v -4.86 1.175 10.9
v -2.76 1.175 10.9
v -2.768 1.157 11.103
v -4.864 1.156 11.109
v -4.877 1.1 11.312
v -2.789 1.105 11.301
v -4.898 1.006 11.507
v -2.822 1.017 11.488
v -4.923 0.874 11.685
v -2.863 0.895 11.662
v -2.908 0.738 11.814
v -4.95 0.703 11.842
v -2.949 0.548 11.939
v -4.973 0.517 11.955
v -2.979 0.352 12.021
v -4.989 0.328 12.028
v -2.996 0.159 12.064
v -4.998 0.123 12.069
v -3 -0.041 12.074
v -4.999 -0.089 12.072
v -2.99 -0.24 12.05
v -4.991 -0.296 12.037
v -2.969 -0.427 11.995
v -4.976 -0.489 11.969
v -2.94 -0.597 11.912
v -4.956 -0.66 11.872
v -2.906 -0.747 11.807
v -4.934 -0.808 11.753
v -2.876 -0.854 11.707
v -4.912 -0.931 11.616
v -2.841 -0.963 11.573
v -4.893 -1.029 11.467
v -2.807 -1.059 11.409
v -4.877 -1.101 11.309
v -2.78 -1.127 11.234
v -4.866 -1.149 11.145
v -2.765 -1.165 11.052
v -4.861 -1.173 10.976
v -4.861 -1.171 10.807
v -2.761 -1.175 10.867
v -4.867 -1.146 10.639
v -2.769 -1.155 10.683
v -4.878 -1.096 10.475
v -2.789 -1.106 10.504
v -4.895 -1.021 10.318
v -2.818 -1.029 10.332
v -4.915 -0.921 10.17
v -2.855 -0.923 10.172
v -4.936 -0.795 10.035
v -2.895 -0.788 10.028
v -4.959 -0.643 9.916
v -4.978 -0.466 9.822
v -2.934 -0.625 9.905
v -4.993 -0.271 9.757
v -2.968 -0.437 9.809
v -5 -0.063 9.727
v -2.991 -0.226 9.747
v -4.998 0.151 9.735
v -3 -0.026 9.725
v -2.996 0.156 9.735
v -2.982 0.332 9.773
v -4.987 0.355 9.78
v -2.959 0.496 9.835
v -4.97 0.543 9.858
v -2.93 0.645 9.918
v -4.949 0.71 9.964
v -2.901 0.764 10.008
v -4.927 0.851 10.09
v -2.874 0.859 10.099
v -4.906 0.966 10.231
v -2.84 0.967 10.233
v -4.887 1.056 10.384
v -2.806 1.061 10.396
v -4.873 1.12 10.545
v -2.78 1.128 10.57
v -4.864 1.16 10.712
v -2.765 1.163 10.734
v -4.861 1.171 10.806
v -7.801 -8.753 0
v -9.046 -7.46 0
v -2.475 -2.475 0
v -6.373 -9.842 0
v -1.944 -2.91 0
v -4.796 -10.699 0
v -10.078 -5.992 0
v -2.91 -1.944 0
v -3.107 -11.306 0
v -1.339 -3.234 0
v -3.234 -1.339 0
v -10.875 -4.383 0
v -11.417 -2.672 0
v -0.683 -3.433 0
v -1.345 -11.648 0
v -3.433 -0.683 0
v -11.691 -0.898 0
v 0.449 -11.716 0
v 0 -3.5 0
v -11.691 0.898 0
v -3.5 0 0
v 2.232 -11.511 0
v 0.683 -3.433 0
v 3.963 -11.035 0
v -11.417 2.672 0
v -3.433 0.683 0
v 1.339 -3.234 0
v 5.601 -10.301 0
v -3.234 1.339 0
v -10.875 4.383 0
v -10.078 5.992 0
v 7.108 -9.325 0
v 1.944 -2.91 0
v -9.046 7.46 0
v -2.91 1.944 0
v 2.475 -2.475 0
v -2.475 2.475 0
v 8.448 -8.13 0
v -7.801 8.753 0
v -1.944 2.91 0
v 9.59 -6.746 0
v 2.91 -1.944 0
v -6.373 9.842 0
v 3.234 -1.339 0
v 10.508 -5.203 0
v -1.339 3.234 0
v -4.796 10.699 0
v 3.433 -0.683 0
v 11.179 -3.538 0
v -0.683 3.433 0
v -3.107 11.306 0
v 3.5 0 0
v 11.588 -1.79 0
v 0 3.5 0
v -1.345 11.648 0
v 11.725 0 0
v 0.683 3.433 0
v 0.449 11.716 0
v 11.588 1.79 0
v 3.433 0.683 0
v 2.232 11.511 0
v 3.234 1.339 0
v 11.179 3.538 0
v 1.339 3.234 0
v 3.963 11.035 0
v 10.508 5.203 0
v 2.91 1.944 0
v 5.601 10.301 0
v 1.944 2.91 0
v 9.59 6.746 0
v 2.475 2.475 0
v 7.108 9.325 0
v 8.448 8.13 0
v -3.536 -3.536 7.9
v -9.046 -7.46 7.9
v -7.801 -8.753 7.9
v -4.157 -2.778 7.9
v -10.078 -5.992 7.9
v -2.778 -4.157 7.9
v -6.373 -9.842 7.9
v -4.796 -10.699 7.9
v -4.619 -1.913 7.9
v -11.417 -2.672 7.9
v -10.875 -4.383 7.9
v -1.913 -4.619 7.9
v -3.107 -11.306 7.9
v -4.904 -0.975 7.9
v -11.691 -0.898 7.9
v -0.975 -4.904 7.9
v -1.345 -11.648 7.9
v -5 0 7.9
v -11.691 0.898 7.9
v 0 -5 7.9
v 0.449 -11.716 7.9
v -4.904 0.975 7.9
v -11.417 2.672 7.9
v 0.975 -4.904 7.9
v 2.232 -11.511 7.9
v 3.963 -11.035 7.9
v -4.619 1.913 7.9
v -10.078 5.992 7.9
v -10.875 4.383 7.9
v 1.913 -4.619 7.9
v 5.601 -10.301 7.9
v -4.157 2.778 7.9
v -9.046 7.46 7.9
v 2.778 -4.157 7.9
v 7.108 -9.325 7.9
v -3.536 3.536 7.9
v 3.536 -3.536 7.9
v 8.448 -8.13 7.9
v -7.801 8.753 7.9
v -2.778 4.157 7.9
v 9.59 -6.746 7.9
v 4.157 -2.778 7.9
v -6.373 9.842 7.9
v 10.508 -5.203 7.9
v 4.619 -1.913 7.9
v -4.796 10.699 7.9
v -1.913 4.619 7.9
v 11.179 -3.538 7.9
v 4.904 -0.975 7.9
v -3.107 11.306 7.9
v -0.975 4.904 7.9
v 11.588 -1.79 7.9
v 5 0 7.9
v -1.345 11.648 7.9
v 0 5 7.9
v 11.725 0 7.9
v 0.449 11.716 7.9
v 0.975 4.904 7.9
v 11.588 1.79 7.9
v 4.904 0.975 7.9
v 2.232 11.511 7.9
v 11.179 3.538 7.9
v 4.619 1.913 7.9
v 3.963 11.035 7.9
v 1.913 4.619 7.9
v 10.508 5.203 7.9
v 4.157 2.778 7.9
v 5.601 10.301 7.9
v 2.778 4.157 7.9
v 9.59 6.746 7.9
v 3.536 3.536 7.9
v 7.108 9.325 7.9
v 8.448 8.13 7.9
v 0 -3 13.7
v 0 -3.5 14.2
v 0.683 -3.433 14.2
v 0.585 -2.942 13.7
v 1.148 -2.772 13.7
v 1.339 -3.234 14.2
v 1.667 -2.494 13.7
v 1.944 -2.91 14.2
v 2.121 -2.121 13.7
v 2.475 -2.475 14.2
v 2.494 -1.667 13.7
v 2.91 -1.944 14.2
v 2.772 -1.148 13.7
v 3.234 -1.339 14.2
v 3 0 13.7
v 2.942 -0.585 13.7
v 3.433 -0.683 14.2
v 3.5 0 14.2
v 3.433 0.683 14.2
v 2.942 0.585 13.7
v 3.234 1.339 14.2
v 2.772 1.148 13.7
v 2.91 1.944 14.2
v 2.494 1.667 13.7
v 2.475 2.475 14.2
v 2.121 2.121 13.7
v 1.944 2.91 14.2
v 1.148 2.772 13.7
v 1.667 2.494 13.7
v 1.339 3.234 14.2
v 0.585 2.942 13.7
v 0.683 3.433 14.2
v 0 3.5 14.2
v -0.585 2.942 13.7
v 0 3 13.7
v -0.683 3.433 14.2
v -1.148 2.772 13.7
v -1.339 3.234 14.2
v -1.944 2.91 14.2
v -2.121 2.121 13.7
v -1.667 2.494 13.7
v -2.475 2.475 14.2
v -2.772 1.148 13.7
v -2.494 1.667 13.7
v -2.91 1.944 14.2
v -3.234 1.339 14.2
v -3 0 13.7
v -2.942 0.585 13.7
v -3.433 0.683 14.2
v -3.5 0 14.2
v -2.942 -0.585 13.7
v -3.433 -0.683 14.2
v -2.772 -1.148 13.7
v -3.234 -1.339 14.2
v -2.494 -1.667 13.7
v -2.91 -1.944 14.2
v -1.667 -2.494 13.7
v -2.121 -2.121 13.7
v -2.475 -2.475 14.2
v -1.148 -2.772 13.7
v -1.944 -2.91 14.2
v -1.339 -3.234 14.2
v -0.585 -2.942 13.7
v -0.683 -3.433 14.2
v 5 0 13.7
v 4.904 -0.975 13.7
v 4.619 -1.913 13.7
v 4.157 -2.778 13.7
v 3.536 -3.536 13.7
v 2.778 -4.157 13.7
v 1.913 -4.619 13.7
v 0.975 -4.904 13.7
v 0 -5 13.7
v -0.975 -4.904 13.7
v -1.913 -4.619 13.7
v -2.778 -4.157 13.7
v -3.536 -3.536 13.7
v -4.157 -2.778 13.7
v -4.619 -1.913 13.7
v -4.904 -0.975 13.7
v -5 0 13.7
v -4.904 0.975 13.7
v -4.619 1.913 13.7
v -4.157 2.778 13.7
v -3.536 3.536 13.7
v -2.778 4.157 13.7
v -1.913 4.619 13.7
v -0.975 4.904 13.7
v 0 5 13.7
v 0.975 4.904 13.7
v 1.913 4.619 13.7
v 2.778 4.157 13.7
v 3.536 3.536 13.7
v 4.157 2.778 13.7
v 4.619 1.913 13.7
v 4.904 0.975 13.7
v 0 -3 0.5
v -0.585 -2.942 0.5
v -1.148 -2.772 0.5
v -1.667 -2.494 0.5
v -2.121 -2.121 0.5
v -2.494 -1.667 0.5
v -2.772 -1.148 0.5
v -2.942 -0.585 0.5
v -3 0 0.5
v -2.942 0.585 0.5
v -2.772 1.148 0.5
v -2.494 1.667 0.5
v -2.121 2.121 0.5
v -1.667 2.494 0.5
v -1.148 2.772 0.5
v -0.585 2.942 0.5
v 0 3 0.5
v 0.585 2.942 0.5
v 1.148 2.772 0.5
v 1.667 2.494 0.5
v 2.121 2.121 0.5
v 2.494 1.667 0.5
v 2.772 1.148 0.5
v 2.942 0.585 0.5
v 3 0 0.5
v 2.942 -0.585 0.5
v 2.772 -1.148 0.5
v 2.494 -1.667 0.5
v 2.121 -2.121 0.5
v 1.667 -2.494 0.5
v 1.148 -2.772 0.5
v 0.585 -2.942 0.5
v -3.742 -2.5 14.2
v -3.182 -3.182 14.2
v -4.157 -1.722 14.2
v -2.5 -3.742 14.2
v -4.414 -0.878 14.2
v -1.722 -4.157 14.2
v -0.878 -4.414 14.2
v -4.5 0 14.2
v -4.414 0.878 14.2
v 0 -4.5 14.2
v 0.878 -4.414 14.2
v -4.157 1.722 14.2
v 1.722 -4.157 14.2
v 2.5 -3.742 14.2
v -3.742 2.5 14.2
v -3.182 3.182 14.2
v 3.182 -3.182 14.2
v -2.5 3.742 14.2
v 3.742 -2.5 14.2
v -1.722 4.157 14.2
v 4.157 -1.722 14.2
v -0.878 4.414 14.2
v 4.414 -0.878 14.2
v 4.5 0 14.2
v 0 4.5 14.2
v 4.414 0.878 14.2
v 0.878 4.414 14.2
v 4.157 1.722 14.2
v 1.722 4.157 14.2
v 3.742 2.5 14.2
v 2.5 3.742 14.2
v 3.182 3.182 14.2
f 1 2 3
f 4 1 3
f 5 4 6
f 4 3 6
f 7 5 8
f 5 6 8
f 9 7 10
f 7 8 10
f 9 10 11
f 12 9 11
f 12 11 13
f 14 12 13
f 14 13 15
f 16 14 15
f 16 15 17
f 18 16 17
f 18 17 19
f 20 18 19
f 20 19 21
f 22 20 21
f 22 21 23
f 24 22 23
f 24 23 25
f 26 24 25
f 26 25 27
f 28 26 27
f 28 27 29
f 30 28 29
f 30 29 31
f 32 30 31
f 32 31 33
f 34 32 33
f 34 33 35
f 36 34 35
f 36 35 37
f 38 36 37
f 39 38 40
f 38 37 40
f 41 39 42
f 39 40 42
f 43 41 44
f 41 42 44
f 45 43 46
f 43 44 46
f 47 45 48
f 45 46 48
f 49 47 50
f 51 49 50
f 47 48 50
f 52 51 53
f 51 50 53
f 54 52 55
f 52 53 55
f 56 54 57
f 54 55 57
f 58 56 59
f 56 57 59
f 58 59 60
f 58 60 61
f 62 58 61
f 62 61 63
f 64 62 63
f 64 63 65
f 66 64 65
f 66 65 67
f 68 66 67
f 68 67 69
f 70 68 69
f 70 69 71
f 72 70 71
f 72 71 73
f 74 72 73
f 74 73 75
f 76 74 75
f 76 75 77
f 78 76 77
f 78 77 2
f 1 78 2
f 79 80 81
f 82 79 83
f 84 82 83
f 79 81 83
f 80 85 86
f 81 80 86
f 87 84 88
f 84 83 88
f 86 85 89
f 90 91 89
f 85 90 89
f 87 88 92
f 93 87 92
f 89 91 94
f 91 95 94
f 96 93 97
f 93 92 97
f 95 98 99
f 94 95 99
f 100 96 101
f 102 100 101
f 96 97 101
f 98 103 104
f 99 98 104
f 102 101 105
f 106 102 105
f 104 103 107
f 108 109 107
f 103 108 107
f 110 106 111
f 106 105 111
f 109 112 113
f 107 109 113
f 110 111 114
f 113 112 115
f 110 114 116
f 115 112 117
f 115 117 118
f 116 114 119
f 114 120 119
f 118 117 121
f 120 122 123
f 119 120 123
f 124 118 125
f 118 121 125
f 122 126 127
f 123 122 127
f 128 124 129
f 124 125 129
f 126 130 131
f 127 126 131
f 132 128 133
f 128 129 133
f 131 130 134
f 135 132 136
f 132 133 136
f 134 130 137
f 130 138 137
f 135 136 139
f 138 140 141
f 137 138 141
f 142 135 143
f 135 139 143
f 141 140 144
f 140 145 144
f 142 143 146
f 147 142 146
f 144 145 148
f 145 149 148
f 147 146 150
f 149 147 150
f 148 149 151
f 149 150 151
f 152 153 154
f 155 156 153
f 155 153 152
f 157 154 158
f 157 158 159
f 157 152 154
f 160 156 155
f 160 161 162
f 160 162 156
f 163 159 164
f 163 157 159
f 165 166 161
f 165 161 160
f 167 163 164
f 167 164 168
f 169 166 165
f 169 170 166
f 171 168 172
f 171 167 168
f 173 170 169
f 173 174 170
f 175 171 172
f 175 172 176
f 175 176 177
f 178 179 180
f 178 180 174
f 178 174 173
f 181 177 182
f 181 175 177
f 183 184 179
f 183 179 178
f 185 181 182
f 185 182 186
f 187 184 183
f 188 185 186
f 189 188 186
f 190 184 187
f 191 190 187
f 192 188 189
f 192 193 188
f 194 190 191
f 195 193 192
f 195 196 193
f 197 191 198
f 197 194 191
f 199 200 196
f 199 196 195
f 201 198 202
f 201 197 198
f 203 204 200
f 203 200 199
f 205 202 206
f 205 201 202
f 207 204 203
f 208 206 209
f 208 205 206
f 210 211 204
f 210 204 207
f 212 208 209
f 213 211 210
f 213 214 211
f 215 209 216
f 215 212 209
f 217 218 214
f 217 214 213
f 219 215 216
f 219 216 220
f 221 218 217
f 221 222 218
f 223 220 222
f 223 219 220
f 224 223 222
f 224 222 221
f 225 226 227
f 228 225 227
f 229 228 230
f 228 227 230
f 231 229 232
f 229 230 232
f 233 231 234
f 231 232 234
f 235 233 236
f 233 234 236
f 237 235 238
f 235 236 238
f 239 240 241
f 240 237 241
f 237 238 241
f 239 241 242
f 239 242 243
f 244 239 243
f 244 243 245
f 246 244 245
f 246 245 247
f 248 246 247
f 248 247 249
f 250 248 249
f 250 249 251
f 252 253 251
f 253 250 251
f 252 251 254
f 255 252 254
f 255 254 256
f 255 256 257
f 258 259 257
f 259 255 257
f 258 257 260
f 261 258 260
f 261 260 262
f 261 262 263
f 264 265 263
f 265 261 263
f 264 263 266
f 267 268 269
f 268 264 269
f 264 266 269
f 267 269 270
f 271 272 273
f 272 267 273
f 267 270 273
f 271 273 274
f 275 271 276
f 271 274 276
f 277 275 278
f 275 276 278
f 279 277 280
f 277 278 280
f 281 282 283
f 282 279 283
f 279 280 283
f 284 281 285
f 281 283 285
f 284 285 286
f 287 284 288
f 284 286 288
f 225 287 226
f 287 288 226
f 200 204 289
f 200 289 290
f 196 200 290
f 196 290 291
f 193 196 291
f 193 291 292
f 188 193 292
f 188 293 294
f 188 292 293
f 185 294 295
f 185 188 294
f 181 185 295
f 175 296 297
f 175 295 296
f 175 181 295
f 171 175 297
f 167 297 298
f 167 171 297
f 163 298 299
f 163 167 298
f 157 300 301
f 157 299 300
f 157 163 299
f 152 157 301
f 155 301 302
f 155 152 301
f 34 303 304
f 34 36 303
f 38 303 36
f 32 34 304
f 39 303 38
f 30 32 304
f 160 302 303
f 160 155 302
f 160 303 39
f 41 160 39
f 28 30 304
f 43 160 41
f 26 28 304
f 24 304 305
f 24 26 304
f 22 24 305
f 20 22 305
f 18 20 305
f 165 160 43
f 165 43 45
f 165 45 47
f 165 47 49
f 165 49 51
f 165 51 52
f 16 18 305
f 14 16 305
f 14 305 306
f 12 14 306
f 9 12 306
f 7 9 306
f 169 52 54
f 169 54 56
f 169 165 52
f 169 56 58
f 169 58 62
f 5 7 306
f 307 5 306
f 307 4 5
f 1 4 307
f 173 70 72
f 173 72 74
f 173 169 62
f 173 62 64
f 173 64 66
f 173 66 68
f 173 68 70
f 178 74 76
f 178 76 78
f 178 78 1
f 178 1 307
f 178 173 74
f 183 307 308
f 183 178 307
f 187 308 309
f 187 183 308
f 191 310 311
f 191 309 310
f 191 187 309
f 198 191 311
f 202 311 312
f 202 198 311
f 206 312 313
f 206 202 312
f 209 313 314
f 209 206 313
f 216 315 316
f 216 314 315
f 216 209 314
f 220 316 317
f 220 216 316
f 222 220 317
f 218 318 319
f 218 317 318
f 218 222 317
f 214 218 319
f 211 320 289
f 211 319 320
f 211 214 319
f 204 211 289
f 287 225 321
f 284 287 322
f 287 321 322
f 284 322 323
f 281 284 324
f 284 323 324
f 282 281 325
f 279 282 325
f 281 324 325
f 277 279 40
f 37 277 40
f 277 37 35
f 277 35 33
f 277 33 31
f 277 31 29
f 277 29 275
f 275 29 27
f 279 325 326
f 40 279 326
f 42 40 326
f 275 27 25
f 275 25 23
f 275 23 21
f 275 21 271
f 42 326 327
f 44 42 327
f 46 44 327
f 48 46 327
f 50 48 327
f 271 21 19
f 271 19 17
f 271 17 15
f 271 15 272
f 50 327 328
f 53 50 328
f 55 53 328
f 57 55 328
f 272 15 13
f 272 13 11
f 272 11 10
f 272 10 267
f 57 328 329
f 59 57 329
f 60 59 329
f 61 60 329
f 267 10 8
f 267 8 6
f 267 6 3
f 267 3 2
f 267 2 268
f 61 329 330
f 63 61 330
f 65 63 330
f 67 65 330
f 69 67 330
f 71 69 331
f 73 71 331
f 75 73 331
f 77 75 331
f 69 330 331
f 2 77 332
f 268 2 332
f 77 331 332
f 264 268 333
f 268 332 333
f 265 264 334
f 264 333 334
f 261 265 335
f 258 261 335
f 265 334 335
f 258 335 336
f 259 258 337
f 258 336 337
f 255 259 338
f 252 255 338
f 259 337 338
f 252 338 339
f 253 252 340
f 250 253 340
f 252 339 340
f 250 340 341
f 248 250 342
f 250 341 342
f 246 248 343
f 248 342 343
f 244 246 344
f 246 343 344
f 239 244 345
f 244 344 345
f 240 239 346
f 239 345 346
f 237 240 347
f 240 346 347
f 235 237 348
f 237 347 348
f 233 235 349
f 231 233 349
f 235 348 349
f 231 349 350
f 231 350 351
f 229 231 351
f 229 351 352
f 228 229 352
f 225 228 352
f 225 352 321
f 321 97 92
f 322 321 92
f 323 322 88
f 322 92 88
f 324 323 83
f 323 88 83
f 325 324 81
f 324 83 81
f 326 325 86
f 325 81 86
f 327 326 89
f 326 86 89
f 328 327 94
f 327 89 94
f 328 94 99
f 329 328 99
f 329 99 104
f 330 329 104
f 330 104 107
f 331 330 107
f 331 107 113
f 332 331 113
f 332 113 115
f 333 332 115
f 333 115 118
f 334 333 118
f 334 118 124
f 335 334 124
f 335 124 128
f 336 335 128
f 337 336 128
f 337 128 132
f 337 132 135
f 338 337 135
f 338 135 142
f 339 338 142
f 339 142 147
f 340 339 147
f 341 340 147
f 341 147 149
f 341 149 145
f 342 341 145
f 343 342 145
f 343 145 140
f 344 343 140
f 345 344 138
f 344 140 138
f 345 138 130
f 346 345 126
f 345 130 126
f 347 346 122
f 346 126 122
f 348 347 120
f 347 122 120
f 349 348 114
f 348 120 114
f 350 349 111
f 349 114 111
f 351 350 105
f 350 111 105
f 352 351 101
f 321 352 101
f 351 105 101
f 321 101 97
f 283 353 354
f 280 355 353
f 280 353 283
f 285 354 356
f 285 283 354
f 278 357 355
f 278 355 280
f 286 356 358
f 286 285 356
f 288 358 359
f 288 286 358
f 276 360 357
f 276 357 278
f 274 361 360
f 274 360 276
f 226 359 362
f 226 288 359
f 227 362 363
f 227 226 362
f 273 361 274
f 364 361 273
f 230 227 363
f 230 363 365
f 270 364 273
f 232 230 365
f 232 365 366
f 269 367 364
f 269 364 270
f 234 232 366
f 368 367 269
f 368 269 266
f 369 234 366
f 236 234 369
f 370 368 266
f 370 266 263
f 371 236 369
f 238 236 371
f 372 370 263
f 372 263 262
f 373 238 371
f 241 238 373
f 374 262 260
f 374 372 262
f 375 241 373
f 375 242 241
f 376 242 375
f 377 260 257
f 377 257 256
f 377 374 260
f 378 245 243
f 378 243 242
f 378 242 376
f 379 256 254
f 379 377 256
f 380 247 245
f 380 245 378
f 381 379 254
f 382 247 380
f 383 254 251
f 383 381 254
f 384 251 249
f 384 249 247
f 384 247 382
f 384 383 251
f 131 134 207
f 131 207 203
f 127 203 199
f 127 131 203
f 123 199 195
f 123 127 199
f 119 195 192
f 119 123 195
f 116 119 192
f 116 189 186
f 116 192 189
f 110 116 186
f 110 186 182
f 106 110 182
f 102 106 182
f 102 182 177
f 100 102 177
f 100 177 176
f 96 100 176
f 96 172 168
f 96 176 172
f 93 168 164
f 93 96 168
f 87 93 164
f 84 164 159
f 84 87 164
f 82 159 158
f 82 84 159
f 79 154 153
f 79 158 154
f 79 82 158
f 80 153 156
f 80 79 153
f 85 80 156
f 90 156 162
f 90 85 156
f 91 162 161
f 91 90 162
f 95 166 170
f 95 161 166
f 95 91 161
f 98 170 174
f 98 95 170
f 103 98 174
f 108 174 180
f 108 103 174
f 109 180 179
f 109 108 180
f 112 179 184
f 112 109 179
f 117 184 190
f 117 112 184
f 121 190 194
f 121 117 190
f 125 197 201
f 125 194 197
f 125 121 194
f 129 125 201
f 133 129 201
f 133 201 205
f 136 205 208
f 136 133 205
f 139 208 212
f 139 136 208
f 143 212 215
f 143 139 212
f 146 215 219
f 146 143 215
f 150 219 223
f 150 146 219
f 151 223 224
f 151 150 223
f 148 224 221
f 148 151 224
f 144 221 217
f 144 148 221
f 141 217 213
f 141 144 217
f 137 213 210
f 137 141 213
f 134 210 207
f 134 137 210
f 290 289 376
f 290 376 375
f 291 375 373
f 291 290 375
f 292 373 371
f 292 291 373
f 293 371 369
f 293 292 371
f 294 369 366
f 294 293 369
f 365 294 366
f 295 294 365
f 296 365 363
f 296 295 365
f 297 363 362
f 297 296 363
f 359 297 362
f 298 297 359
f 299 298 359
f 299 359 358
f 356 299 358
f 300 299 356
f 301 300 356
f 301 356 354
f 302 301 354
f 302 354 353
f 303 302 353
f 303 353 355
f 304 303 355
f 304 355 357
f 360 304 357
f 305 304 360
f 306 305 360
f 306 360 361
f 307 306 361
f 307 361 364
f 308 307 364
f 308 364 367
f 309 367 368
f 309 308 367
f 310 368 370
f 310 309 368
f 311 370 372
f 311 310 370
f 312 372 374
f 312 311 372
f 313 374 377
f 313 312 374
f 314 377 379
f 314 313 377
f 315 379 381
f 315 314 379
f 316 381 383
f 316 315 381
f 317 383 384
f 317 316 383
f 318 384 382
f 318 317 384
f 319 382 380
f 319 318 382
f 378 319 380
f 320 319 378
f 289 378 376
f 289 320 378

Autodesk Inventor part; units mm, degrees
ref_plane "YZ Plane" through (0, 0, 0) normal (1, 0, 0) x (0, 1, 0)
ref_plane "XZ Plane" through (0, 0, 0) normal (0, 1, 0) x (-1, 0, 0)
ref_plane "XY Plane" through (0, 0, 0) normal (0, 0, 1) x (1, 0, 0)
sketch "草圖1" plane through (0, 0, 0) normal (0, 0, 1) x (1, 0, 0)
  circle A0 centre (0, 0) radius 11.725
  dimension "d0" = 23.45
extrude "擠出1" add sketch "草圖1" along normal blind 7.9
sketch "草圖2" plane through (0, 0, 7.9) normal (0, 0, 1) x (1, 0, 0)
  circle A0 centre (0, 0) radius 5
  dimension "d3" = 10
extrude "擠出2" add sketch "草圖2" along normal blind 6.3
hole "孔1" at (0, 0, 14.2) direction (0, 0, -1) diameter 6 end through all
chamfer "倒角1" distance 0.5 angle 45 3 edges at (0, 3, 14.2) (0, 3, 0) (-5, 0, 14.2)
sketch "草圖3" plane through (0, 0, 0) normal (1, 0, 0) x (0, 1, 0)
  circle A0 centre (0, 10.9) radius 1.175
  line L0 (-4.5, 14.2) -> (4.5, 14.2) projected
  point P0 (0, 0)
  dimension "d18" = 2.35
  dimension "d19" = 3.3
extrude "擠出3" cut sketch "草圖3" against normal through all
properties part number "齒輪"
